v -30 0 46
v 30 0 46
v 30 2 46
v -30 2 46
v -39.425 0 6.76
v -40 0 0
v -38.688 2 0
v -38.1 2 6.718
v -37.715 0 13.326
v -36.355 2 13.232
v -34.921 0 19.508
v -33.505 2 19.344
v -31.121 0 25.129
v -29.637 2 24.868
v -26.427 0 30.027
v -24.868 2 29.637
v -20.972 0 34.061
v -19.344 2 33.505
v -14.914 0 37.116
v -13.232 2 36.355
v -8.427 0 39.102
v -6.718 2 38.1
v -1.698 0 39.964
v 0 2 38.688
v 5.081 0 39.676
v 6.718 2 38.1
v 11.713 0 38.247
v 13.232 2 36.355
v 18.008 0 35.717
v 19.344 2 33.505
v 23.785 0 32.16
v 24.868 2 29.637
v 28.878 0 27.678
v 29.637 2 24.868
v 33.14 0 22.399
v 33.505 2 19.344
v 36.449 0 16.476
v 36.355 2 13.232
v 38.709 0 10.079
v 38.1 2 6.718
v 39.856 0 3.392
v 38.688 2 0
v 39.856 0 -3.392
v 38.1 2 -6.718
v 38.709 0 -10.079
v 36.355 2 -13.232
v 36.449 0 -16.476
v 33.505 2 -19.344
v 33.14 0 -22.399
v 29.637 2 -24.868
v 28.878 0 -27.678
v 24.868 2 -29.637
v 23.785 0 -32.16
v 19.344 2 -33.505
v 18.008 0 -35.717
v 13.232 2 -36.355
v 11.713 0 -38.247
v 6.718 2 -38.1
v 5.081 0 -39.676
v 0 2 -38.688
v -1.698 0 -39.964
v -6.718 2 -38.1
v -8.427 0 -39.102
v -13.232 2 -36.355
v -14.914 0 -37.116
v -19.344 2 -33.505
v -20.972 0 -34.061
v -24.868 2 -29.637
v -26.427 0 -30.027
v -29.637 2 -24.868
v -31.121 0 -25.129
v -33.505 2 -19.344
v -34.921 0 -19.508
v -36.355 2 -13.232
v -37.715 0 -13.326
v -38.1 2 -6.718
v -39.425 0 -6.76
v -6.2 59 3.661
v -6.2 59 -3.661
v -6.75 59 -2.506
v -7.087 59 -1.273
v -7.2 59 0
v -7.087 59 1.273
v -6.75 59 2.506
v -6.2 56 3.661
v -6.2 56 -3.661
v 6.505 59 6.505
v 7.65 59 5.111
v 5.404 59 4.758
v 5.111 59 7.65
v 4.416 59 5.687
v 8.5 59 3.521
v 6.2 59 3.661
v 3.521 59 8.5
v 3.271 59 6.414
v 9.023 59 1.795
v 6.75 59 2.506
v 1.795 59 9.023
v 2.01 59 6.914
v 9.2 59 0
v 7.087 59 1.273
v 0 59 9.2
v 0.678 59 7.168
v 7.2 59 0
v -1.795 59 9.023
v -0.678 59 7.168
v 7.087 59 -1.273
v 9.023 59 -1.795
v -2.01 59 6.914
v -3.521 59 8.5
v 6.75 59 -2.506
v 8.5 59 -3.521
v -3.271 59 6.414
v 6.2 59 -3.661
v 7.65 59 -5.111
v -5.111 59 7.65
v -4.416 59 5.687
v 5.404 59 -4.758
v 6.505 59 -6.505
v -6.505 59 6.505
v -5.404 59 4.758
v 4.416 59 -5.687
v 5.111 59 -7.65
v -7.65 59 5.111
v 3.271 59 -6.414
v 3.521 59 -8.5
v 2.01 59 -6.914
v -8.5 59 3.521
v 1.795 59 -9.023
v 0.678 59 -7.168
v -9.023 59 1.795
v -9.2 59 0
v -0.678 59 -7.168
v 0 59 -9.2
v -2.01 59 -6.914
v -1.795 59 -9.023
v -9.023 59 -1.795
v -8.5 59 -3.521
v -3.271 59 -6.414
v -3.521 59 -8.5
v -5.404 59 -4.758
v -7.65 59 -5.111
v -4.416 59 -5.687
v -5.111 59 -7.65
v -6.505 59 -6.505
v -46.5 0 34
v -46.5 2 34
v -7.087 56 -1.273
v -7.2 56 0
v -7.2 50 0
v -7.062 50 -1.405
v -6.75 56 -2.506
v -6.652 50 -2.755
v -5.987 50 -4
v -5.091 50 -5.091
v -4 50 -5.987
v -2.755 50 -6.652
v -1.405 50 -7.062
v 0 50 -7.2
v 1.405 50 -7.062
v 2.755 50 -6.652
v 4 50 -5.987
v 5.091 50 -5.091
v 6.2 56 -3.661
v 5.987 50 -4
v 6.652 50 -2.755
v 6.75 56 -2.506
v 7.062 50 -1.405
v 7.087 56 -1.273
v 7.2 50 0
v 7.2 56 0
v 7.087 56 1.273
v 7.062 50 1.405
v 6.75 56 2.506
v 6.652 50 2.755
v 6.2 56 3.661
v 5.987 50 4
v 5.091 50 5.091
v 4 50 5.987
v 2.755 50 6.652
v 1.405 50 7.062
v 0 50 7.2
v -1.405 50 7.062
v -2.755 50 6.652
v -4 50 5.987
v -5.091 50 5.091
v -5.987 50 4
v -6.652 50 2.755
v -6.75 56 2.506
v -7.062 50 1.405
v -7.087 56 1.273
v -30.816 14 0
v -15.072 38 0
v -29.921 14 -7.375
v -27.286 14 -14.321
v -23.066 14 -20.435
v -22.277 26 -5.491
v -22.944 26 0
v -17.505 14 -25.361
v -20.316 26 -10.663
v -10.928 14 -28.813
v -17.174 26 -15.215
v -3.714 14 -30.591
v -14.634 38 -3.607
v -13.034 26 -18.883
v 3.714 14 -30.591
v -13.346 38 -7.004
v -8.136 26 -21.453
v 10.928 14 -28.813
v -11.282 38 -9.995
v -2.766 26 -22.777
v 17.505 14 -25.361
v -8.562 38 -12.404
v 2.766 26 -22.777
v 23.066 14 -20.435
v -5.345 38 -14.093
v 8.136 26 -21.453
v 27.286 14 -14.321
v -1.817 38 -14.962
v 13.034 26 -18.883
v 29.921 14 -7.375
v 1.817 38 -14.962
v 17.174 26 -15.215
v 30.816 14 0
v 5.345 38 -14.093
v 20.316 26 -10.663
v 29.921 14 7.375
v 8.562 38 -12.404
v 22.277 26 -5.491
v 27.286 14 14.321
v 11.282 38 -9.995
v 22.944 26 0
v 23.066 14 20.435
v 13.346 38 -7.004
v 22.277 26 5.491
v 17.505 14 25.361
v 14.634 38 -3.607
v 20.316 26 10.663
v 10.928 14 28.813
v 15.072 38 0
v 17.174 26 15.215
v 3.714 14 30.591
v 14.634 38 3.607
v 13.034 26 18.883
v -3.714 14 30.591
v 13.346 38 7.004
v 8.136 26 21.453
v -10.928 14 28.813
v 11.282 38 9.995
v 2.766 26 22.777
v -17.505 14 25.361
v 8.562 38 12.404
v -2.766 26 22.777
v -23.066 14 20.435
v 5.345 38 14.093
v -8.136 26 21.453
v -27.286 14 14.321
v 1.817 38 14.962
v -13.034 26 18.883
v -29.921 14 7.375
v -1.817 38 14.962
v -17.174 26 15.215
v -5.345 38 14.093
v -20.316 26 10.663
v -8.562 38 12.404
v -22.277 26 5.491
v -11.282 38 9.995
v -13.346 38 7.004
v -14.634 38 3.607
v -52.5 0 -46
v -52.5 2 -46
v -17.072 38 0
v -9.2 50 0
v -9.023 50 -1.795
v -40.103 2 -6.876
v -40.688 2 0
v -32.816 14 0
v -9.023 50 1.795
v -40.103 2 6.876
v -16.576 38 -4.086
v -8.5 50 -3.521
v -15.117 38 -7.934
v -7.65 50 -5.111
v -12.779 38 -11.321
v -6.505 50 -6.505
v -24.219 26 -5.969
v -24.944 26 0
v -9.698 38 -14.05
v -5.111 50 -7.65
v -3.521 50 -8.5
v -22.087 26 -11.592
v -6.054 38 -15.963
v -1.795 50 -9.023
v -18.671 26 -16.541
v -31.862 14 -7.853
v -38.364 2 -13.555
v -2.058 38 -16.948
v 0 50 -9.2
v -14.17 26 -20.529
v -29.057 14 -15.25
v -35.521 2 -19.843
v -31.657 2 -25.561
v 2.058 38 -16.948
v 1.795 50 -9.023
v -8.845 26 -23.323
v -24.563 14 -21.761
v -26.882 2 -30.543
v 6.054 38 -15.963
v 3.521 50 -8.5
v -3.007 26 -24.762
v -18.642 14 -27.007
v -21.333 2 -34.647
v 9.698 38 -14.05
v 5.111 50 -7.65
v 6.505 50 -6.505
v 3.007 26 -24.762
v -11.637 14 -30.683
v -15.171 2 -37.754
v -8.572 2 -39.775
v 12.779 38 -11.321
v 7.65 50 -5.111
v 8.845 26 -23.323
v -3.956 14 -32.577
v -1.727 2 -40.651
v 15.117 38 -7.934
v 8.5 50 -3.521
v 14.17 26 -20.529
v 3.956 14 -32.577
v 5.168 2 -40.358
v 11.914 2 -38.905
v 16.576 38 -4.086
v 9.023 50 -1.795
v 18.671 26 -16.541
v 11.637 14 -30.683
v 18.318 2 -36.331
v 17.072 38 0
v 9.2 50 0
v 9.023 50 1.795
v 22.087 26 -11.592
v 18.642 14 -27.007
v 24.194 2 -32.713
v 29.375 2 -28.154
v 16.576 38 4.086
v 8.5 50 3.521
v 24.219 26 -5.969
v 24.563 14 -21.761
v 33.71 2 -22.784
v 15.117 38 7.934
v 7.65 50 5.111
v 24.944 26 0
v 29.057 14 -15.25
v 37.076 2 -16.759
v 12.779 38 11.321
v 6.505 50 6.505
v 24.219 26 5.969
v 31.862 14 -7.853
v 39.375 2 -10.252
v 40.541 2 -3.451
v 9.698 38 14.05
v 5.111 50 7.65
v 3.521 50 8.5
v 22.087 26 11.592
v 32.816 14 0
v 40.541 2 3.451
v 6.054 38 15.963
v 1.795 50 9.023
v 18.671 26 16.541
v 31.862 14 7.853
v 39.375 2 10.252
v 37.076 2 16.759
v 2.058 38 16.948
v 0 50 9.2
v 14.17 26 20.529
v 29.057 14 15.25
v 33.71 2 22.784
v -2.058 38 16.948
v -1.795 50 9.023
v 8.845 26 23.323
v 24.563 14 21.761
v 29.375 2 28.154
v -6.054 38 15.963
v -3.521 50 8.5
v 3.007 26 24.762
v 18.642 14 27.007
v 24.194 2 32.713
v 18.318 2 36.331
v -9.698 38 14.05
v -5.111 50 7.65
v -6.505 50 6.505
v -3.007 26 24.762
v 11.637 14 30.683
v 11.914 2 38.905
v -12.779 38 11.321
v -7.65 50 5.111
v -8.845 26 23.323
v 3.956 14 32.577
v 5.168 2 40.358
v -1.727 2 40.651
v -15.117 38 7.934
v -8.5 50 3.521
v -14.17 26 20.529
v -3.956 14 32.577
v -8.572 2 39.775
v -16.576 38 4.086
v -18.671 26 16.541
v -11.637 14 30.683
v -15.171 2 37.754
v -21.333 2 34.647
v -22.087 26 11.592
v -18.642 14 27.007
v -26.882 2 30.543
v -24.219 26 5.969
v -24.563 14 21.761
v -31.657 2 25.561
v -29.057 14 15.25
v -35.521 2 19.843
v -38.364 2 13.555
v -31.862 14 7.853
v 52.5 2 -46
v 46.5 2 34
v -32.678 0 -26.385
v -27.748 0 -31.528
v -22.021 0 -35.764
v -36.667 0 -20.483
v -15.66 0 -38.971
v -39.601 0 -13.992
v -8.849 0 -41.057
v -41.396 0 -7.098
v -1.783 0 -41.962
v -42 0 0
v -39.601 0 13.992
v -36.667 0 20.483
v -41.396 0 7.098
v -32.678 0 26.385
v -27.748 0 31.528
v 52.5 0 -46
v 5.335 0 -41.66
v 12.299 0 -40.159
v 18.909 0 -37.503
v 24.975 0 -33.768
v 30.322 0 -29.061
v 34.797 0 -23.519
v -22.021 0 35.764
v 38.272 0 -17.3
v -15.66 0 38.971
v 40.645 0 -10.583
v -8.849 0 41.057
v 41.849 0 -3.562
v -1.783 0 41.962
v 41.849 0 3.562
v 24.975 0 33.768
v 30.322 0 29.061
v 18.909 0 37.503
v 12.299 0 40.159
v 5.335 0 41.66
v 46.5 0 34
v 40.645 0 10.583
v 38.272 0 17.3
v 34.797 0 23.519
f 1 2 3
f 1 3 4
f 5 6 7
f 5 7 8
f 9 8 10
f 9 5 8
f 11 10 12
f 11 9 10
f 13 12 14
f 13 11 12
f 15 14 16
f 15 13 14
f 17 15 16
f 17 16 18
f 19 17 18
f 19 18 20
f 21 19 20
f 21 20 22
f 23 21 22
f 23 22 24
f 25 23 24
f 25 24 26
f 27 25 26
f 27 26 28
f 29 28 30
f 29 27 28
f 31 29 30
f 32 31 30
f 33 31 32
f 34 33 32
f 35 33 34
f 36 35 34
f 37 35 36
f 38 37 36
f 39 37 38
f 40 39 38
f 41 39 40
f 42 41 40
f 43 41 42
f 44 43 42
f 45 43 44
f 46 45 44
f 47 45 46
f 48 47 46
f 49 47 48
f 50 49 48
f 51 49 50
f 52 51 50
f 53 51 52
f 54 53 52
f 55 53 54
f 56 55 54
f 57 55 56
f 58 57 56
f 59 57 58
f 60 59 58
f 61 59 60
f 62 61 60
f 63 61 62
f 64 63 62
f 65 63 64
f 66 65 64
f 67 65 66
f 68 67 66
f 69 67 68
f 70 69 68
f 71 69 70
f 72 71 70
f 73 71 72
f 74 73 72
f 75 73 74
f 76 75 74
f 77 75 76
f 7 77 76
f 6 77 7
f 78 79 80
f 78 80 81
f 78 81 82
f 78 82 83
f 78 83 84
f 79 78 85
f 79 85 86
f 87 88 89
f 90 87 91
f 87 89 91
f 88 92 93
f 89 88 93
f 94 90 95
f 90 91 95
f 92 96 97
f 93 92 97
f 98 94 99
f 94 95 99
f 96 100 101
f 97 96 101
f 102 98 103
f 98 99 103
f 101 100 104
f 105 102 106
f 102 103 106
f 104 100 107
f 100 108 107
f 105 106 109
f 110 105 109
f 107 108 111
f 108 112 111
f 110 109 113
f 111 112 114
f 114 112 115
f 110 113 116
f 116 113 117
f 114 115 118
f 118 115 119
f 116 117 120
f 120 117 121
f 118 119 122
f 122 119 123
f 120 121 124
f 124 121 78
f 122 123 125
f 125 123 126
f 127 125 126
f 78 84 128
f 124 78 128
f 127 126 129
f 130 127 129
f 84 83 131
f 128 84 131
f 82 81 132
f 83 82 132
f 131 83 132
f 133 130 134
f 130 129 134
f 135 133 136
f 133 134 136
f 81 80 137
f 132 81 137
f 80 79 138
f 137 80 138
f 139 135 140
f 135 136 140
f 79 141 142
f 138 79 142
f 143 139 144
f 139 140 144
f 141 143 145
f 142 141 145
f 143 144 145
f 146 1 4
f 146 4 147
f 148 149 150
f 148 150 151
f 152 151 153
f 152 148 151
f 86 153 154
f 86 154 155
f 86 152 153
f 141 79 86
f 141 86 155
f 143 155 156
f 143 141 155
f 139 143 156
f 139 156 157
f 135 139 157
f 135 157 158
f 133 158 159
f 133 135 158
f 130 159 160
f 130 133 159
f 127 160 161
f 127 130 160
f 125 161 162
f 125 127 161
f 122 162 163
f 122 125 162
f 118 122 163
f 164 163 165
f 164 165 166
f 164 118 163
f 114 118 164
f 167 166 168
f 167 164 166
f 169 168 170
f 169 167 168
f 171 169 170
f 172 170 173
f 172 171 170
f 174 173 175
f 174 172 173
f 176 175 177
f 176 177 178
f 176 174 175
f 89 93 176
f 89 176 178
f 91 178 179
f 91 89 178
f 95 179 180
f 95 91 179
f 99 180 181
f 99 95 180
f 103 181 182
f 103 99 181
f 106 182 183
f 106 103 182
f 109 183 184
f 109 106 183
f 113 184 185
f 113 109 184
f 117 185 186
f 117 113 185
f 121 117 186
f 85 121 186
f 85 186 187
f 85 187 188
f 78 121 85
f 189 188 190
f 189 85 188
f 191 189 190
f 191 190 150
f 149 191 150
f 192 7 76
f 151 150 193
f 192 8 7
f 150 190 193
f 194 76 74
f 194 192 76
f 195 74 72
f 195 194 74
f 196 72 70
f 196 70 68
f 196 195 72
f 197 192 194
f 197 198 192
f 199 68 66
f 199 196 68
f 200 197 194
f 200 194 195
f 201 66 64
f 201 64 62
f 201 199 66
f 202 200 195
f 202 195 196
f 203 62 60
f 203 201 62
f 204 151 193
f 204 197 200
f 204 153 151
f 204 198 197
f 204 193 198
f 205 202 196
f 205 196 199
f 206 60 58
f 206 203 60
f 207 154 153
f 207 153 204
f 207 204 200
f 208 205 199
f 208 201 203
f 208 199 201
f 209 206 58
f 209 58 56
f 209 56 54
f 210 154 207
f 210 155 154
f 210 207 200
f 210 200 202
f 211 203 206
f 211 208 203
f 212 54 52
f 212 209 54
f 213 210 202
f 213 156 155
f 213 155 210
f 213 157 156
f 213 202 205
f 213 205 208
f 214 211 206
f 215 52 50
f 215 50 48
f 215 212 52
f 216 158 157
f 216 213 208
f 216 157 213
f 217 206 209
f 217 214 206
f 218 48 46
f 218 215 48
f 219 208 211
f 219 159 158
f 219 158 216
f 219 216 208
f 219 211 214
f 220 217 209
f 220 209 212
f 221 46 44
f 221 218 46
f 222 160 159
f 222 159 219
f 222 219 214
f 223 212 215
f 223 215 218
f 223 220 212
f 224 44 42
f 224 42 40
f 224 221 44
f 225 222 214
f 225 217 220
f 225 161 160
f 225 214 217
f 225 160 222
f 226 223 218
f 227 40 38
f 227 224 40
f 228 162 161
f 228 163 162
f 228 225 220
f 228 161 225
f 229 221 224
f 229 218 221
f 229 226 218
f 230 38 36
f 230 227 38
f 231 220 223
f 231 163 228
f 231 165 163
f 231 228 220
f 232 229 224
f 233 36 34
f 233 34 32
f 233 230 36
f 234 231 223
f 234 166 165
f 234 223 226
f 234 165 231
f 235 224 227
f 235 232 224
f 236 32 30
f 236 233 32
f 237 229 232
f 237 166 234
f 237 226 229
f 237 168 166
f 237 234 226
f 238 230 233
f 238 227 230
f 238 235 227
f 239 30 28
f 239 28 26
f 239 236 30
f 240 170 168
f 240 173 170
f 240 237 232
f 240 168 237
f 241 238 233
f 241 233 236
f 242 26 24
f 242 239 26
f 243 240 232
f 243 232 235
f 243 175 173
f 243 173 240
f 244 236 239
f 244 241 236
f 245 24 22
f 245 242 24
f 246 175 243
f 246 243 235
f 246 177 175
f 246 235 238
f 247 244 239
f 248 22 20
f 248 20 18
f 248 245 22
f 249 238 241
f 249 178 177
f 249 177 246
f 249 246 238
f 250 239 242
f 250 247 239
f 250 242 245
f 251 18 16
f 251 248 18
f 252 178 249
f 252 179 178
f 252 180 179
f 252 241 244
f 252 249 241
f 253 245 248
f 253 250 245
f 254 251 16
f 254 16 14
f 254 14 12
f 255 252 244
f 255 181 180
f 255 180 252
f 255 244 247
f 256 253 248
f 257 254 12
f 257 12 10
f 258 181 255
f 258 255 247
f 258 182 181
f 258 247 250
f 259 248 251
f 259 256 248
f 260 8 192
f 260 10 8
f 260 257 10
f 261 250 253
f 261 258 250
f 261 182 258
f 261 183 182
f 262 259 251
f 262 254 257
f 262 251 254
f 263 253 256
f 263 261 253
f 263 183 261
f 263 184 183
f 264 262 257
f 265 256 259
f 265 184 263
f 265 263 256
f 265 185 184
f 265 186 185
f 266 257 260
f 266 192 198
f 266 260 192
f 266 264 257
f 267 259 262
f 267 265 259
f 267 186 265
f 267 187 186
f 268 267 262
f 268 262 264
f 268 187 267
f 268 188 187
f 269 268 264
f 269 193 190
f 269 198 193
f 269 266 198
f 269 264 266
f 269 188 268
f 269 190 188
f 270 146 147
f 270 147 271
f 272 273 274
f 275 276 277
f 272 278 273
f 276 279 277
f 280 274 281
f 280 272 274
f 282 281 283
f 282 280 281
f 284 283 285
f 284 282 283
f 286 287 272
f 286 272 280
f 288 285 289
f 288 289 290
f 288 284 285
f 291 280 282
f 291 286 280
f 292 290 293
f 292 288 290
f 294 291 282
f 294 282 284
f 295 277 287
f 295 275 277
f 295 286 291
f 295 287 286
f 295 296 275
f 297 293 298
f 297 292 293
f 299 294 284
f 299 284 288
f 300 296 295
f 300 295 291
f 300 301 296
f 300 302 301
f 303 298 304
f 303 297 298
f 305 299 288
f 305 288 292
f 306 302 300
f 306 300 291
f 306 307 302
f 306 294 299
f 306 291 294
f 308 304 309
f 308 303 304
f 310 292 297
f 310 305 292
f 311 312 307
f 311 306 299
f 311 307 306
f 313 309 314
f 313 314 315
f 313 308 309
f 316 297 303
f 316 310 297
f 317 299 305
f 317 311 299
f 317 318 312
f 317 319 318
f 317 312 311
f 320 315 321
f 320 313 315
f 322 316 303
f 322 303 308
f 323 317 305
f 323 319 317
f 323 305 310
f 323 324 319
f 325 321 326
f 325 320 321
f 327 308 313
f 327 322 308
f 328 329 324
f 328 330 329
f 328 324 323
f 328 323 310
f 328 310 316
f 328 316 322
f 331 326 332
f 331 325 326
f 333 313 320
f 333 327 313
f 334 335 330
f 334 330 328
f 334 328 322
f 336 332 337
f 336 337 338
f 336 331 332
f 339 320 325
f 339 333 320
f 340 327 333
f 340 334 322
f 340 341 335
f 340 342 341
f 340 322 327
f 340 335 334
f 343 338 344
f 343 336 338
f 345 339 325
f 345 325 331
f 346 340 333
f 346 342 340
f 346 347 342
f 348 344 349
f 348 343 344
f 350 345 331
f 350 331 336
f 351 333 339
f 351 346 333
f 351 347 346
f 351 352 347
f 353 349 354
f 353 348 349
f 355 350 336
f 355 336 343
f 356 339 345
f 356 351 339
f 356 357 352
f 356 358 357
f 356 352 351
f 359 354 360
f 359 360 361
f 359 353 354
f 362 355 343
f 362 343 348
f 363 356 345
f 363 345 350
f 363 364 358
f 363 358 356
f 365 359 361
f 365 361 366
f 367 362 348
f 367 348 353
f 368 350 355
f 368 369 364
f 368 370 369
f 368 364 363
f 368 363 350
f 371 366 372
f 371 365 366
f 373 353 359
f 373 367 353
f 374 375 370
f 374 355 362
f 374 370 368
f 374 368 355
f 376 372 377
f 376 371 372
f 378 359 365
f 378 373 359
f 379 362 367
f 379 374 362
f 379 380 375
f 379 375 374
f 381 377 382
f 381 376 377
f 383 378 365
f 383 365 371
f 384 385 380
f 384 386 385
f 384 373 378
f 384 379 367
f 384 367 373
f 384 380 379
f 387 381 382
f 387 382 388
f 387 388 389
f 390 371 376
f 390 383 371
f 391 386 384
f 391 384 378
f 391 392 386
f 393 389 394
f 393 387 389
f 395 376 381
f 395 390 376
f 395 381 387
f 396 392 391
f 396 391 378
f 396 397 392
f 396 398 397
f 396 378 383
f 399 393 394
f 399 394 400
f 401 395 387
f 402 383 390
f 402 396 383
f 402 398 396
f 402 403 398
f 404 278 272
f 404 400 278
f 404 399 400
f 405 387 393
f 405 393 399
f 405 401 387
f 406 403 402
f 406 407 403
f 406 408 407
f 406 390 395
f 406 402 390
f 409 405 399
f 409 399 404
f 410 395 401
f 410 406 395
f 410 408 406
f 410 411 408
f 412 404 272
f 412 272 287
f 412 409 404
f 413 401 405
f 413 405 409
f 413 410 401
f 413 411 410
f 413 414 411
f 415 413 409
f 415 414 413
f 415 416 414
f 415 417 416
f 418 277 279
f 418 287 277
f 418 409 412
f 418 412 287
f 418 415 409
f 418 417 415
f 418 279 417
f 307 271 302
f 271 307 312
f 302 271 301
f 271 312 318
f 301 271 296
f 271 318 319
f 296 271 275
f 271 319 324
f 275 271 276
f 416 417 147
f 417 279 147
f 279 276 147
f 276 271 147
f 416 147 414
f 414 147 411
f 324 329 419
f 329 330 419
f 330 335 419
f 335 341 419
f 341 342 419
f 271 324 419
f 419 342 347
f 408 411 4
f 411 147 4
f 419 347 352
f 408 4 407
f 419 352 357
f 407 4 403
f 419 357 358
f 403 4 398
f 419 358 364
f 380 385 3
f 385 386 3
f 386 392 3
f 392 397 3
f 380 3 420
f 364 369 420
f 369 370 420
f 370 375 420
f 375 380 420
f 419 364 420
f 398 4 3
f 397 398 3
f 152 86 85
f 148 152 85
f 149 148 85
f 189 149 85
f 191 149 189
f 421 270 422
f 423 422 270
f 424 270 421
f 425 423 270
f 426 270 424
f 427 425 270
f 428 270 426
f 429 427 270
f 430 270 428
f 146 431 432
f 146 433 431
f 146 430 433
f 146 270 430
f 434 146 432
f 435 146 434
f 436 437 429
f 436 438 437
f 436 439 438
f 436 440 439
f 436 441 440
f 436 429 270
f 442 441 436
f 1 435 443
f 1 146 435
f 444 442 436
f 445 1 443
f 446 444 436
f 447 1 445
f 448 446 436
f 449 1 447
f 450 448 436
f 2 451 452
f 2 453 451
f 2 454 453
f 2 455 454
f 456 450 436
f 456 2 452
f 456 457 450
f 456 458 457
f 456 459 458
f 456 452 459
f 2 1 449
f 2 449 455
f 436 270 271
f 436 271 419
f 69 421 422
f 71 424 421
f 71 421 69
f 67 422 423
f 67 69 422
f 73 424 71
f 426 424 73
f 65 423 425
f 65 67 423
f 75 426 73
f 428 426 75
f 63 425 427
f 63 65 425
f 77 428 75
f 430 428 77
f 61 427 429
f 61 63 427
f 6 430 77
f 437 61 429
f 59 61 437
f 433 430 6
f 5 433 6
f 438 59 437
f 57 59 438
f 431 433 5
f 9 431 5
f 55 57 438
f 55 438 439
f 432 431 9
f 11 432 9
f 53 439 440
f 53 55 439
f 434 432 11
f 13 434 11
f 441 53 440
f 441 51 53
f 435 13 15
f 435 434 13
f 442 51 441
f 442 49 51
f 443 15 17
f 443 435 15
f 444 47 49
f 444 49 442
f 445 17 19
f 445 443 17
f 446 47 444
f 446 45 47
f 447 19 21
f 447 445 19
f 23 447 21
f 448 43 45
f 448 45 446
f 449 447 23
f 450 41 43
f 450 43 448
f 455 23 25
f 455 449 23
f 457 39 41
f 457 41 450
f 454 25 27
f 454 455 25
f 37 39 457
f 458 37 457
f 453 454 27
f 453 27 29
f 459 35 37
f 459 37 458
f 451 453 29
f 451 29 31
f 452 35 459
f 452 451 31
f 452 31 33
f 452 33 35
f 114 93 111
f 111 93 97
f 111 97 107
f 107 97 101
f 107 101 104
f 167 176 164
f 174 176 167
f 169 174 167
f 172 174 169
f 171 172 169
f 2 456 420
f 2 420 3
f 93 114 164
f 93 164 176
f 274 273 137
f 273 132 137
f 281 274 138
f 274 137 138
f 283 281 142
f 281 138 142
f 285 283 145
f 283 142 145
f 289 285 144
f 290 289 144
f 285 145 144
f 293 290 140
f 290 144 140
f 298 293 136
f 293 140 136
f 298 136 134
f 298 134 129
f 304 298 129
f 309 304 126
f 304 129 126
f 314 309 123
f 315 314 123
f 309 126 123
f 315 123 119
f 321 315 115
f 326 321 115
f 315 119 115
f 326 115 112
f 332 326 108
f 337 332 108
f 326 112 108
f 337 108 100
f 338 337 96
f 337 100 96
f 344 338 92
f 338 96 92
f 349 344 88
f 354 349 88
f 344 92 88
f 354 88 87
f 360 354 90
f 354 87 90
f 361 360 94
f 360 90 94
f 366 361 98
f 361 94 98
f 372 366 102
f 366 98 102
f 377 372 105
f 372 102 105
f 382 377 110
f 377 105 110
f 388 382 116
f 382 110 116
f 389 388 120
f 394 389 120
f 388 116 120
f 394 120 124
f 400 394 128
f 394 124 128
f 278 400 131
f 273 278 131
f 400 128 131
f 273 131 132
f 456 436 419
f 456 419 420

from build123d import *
from build123d import SkipClean  # not in build123d's __all__

# Parameters (mm, degrees)
F2_DEPTH = 2
F1_W     = 2
F1_H     = 9
F6_DEPTH = 3


with BuildPart() as f2:
    # F0 (on Front) → F2 (new body)
    with BuildSketch(Plane.XZ):
        Polygon((-52.5, -46), (52.5, -46), (46.5, 34), (30, 46), (-30, 46), (-46.5, 34), align=None)
    extrude(amount=-F2_DEPTH)

    # F1 (on Top) → F3 (revolve, cut)
    with BuildSketch(Plane.XY):
        Polygon((-20, 0), (0, 0), (0, 50), (-7.2, 50), (-40, 0), (-22, 0), align=None)
    revolve(axis=Axis((0, 25, 0), (0, 1, 0)), mode=Mode.SUBTRACT)

    # F1 (on Top) → F4 (revolve)
    with BuildSketch(Plane.XY):
        Polygon((-40, 0), (-7.2, 50), (-9.2, 50), (-42, 0), align=None)
        with Locations((-8.2, 54.5)):
            Rectangle(F1_W, F1_H)
    with SkipClean():  # cleaning this boolean's faces spoils the solid; the shape is the same uncleaned
        revolve(axis=Axis((0, 2, 0), (0, -1, 0)))

    # F5 (on face) → F6 (join)
    with BuildSketch(Plane(origin=(0, 59, 0), x_dir=(-1, 0, 0), z_dir=(0, 1, 0))):
        with BuildLine():
            Line((-6.2, -3.6606010435), (-6.2, 0))
            Line((-6.2, 0), (-6.2, 3.6606010435))
            ThreePointArc((-6.2, 3.6606010435), (-7.2, 0), (-6.2, -3.6606010435))
        make_face()
        with BuildLine():
            ThreePointArc((7.2, 0), (6.9455021417, 1.8973665961), (6.2, 3.6606010435))
            Line((6.2, 3.6606010435), (6.2, -3.6606010435))
            ThreePointArc((6.2, -3.6606010435), (6.9455021417, -1.8973665961), (7.2, 0))
        make_face()
    with SkipClean():  # cleaning this boolean's faces spoils the solid; the shape is the same uncleaned
        extrude(amount=-F6_DEPTH)


solid = f2.part
